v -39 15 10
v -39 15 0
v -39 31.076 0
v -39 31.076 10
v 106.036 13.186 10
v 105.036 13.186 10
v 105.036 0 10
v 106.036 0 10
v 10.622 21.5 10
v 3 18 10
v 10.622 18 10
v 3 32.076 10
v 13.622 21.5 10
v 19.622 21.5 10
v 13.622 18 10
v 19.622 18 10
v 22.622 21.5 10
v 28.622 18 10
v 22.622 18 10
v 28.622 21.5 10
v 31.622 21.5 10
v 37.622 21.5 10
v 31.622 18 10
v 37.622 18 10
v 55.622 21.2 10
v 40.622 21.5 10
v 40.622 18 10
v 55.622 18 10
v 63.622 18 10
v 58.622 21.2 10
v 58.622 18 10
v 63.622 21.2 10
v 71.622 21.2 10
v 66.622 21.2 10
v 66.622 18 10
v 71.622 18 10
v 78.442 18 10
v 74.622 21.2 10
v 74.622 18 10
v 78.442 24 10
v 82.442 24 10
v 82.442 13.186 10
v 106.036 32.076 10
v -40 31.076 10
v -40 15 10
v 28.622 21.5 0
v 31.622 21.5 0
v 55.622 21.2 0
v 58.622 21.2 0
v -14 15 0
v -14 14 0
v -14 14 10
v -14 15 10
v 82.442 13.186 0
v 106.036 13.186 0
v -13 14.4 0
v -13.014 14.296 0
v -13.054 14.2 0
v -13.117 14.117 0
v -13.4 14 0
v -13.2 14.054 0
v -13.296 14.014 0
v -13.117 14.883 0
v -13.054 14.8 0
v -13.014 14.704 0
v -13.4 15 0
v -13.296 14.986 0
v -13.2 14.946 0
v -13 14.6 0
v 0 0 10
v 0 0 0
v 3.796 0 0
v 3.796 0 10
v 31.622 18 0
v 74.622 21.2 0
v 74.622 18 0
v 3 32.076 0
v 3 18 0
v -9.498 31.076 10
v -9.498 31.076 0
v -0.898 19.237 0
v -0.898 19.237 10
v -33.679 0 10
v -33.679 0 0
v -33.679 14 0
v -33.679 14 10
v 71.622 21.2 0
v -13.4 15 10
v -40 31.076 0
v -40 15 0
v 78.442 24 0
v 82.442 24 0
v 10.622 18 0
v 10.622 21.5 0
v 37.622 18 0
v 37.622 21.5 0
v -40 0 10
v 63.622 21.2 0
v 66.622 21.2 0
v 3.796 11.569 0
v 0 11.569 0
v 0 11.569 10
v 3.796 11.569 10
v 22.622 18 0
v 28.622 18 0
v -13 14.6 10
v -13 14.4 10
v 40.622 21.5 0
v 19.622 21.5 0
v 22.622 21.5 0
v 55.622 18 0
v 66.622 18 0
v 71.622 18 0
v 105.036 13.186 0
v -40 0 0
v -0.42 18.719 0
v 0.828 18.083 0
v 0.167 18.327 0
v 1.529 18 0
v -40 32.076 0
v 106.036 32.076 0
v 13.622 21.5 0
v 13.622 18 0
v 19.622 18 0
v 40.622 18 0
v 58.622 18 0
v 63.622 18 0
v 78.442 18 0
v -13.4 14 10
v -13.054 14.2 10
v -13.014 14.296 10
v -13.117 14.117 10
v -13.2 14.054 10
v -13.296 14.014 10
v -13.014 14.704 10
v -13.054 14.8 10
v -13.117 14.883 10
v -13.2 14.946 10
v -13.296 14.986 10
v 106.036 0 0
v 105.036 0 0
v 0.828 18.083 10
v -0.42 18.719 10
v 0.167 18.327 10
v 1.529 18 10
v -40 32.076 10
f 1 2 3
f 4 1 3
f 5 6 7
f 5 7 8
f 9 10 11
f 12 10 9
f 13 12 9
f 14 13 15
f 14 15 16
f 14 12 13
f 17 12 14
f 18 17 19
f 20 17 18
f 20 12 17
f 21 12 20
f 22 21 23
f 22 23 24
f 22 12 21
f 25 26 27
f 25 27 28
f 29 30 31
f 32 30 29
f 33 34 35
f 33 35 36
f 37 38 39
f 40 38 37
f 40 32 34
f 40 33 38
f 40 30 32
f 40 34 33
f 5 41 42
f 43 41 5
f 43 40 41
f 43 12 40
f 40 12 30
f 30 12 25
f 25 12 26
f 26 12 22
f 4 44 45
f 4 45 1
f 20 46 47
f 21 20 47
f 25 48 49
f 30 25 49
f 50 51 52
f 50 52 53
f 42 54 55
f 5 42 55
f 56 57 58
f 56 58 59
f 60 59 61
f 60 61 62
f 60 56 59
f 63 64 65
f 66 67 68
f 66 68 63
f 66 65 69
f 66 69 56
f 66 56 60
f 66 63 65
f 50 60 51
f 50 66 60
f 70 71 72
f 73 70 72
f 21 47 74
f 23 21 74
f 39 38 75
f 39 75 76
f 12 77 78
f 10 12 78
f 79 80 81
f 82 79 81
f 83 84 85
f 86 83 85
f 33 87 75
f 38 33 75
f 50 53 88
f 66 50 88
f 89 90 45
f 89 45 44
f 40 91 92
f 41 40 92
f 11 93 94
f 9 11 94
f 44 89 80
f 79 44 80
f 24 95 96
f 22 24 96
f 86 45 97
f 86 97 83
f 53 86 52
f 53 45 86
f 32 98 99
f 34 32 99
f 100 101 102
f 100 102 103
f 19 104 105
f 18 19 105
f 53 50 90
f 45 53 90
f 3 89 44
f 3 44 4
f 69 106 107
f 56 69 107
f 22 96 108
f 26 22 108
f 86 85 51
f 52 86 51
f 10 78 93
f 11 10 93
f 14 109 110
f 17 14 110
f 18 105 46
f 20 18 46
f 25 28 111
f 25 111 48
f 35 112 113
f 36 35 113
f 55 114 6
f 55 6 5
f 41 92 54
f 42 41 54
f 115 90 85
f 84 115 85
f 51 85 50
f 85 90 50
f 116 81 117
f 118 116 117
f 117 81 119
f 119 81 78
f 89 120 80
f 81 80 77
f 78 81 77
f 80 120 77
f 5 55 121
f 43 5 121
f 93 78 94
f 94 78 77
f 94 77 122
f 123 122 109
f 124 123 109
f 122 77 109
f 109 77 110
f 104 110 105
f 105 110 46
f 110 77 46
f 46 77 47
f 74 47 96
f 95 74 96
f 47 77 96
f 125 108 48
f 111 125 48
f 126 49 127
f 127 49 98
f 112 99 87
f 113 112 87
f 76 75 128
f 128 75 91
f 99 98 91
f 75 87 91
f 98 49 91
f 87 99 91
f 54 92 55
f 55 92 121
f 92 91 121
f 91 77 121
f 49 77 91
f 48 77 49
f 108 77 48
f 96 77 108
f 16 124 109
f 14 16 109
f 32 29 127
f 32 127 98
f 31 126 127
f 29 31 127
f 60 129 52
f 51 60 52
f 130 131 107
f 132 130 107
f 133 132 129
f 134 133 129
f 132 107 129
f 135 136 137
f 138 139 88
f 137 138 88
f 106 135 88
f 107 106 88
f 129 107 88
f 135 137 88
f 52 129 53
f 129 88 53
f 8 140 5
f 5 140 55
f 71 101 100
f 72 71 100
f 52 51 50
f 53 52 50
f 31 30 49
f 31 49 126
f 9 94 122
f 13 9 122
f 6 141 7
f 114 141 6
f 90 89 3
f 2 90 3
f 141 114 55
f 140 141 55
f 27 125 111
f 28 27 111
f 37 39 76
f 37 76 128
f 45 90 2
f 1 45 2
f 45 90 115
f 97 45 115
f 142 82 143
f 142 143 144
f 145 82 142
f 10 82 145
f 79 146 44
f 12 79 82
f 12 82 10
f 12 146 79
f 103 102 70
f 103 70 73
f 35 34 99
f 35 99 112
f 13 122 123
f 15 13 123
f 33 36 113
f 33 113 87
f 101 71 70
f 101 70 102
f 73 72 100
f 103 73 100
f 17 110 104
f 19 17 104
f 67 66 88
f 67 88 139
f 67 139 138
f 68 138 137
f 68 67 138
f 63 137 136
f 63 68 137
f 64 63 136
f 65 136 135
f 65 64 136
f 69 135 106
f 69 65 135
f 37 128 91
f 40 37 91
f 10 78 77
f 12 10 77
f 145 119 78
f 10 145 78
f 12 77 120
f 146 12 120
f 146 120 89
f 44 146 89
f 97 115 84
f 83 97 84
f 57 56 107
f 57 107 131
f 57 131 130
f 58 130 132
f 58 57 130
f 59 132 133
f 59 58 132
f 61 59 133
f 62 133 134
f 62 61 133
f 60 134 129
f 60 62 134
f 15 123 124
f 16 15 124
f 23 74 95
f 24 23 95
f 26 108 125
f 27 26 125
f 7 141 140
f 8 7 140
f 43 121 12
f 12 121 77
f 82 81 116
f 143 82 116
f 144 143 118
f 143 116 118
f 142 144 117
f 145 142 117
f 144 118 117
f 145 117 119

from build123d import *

# Parameters (mm, degrees)
EXTRUDE_1_DEPTH = 10
EXTRUDE_2_DEPTH = 10
EXTRUDE_3_DEPTH = 10
SKETCH_2_6_W    = 1
SKETCH_2_6_H    = 16.075509251
EXTRUDE_5_DEPTH = 10
SKETCH_2_10_W   = 3.795611852
SKETCH_2_10_H   = 11.568664648
EXTRUDE_7_DEPTH = 10
SKETCH_2_11_W   = 1
SKETCH_2_11_H   = 13.185519622
EXTRUDE_8_DEPTH = 10
EXTRUDE_9_DEPTH = 10


with BuildPart() as part:
    # 草图2 → 凸台-拉伸1 (new body)
    with BuildSketch(Plane.XY):
        with BuildLine():
            Line((-40, 32.075509251), (-40, 31.075509251))
            Line((-40, 31.075509251), (-39, 31.075509251))
            Line((-39, 31.075509251), (-9.497996654, 31.075509251))
            Line((-9.497996654, 31.075509251), (-0.898462522, 19.236877148))
            ThreePointArc((-0.898462522, 19.236877148), (0.166657912, 18.327045777), (1.52875766, 18))
            Line((1.52875766, 18), (3, 18))
            Line((3, 18), (3, 32.075509251))
            Line((3, 32.075509251), (-10.224392581, 32.075509251))
            Line((-10.224392581, 32.075509251), (-40, 32.075509251))
        make_face()
    extrude(amount=EXTRUDE_1_DEPTH)


with BuildPart() as body_2:
    # 草图2<3> → 凸台-拉伸2 (new body)
    with BuildSketch(Plane.XY):
        with BuildLine():
            Line((-14, 15), (-13.4, 15))
            ThreePointArc((-13.4, 15), (-13.117157288, 14.882842712), (-13, 14.6))
            Line((-13, 14.6), (-13, 14.4))
            ThreePointArc((-13, 14.4), (-13.117157288, 14.117157288), (-13.4, 14))
            Line((-13.4, 14), (-14, 14))
            Line((-14, 14), (-14, 15))
        make_face()
    extrude(amount=EXTRUDE_2_DEPTH)


with BuildPart() as body_3:
    # 草图2<4> → 凸台-拉伸3 (new body)
    with BuildSketch(Plane.XY):
        Polygon((-33.67892984, 14), (-14, 14), (-14, 15), (-17.067905555, 15), (-30.43187911, 15), (-39, 15), (-40, 15), (-40, 0), (-33.67892984, 0), align=None)
    extrude(amount=EXTRUDE_3_DEPTH)


with BuildPart() as body_4:
    # 草图2<6> → 凸台-拉伸5 (new body)
    with BuildSketch(Plane.XY):
        with Locations((-39.5, 23.037754626)):
            Rectangle(SKETCH_2_6_W, SKETCH_2_6_H)
    extrude(amount=EXTRUDE_5_DEPTH)


with BuildPart() as body_5:
    # 草图2<10> → 凸台-拉伸7 (new body)
    with BuildSketch(Plane.XY):
        with Locations((1.897805926, 5.784332324)):
            Rectangle(SKETCH_2_10_W, SKETCH_2_10_H)
    extrude(amount=EXTRUDE_7_DEPTH)


with BuildPart() as body_6:
    # 草图2<11> → 凸台-拉伸8 (new body)
    with BuildSketch(Plane.XY):
        with Locations((105.536052446, 6.592759811)):
            Rectangle(SKETCH_2_11_W, SKETCH_2_11_H)
    extrude(amount=EXTRUDE_8_DEPTH)


with BuildPart() as body_7:
    # 草图2<12> → 凸台-拉伸9 (new body)
    with BuildSketch(Plane.XY):
        Polygon((106.036052446, 32.075509251), (3, 32.075509251), (3, 18), (10.622289709, 18), (10.622289709, 21.5), (13.622289709, 21.5), (13.622289709, 18), (19.622289709, 18), (19.622289709, 21.5), (22.622289709, 21.5), (22.622289709, 18), (28.622289709, 18), (28.622289709, 21.5), (31.622289709, 21.5), (31.622289709, 18), (33.949970739, 18), (37.622289709, 18), (37.622289709, 21.5), (40.622289709, 21.5), (40.622289709, 18), (55.622289709, 18), (55.622289709, 21.2), (58.622289709, 21.2), (58.622289709, 18), (63.622289709, 18), (63.622289709, 21.2), (66.622289709, 21.2), (66.622289709, 18), (71.622289709, 18), (71.622289709, 21.2), (74.622289709, 21.2), (74.622289709, 18), (76.982050703, 18), (78.441533019, 18), (78.441533019, 24), (82.441533019, 24), (82.441533019, 13.185519622), (105.036052446, 13.185519622), (106.036052446, 13.185519622), align=None)
    extrude(amount=EXTRUDE_9_DEPTH)


solid = Compound([part.part, body_2.part, body_3.part, body_4.part, body_5.part, body_6.part, body_7.part])
